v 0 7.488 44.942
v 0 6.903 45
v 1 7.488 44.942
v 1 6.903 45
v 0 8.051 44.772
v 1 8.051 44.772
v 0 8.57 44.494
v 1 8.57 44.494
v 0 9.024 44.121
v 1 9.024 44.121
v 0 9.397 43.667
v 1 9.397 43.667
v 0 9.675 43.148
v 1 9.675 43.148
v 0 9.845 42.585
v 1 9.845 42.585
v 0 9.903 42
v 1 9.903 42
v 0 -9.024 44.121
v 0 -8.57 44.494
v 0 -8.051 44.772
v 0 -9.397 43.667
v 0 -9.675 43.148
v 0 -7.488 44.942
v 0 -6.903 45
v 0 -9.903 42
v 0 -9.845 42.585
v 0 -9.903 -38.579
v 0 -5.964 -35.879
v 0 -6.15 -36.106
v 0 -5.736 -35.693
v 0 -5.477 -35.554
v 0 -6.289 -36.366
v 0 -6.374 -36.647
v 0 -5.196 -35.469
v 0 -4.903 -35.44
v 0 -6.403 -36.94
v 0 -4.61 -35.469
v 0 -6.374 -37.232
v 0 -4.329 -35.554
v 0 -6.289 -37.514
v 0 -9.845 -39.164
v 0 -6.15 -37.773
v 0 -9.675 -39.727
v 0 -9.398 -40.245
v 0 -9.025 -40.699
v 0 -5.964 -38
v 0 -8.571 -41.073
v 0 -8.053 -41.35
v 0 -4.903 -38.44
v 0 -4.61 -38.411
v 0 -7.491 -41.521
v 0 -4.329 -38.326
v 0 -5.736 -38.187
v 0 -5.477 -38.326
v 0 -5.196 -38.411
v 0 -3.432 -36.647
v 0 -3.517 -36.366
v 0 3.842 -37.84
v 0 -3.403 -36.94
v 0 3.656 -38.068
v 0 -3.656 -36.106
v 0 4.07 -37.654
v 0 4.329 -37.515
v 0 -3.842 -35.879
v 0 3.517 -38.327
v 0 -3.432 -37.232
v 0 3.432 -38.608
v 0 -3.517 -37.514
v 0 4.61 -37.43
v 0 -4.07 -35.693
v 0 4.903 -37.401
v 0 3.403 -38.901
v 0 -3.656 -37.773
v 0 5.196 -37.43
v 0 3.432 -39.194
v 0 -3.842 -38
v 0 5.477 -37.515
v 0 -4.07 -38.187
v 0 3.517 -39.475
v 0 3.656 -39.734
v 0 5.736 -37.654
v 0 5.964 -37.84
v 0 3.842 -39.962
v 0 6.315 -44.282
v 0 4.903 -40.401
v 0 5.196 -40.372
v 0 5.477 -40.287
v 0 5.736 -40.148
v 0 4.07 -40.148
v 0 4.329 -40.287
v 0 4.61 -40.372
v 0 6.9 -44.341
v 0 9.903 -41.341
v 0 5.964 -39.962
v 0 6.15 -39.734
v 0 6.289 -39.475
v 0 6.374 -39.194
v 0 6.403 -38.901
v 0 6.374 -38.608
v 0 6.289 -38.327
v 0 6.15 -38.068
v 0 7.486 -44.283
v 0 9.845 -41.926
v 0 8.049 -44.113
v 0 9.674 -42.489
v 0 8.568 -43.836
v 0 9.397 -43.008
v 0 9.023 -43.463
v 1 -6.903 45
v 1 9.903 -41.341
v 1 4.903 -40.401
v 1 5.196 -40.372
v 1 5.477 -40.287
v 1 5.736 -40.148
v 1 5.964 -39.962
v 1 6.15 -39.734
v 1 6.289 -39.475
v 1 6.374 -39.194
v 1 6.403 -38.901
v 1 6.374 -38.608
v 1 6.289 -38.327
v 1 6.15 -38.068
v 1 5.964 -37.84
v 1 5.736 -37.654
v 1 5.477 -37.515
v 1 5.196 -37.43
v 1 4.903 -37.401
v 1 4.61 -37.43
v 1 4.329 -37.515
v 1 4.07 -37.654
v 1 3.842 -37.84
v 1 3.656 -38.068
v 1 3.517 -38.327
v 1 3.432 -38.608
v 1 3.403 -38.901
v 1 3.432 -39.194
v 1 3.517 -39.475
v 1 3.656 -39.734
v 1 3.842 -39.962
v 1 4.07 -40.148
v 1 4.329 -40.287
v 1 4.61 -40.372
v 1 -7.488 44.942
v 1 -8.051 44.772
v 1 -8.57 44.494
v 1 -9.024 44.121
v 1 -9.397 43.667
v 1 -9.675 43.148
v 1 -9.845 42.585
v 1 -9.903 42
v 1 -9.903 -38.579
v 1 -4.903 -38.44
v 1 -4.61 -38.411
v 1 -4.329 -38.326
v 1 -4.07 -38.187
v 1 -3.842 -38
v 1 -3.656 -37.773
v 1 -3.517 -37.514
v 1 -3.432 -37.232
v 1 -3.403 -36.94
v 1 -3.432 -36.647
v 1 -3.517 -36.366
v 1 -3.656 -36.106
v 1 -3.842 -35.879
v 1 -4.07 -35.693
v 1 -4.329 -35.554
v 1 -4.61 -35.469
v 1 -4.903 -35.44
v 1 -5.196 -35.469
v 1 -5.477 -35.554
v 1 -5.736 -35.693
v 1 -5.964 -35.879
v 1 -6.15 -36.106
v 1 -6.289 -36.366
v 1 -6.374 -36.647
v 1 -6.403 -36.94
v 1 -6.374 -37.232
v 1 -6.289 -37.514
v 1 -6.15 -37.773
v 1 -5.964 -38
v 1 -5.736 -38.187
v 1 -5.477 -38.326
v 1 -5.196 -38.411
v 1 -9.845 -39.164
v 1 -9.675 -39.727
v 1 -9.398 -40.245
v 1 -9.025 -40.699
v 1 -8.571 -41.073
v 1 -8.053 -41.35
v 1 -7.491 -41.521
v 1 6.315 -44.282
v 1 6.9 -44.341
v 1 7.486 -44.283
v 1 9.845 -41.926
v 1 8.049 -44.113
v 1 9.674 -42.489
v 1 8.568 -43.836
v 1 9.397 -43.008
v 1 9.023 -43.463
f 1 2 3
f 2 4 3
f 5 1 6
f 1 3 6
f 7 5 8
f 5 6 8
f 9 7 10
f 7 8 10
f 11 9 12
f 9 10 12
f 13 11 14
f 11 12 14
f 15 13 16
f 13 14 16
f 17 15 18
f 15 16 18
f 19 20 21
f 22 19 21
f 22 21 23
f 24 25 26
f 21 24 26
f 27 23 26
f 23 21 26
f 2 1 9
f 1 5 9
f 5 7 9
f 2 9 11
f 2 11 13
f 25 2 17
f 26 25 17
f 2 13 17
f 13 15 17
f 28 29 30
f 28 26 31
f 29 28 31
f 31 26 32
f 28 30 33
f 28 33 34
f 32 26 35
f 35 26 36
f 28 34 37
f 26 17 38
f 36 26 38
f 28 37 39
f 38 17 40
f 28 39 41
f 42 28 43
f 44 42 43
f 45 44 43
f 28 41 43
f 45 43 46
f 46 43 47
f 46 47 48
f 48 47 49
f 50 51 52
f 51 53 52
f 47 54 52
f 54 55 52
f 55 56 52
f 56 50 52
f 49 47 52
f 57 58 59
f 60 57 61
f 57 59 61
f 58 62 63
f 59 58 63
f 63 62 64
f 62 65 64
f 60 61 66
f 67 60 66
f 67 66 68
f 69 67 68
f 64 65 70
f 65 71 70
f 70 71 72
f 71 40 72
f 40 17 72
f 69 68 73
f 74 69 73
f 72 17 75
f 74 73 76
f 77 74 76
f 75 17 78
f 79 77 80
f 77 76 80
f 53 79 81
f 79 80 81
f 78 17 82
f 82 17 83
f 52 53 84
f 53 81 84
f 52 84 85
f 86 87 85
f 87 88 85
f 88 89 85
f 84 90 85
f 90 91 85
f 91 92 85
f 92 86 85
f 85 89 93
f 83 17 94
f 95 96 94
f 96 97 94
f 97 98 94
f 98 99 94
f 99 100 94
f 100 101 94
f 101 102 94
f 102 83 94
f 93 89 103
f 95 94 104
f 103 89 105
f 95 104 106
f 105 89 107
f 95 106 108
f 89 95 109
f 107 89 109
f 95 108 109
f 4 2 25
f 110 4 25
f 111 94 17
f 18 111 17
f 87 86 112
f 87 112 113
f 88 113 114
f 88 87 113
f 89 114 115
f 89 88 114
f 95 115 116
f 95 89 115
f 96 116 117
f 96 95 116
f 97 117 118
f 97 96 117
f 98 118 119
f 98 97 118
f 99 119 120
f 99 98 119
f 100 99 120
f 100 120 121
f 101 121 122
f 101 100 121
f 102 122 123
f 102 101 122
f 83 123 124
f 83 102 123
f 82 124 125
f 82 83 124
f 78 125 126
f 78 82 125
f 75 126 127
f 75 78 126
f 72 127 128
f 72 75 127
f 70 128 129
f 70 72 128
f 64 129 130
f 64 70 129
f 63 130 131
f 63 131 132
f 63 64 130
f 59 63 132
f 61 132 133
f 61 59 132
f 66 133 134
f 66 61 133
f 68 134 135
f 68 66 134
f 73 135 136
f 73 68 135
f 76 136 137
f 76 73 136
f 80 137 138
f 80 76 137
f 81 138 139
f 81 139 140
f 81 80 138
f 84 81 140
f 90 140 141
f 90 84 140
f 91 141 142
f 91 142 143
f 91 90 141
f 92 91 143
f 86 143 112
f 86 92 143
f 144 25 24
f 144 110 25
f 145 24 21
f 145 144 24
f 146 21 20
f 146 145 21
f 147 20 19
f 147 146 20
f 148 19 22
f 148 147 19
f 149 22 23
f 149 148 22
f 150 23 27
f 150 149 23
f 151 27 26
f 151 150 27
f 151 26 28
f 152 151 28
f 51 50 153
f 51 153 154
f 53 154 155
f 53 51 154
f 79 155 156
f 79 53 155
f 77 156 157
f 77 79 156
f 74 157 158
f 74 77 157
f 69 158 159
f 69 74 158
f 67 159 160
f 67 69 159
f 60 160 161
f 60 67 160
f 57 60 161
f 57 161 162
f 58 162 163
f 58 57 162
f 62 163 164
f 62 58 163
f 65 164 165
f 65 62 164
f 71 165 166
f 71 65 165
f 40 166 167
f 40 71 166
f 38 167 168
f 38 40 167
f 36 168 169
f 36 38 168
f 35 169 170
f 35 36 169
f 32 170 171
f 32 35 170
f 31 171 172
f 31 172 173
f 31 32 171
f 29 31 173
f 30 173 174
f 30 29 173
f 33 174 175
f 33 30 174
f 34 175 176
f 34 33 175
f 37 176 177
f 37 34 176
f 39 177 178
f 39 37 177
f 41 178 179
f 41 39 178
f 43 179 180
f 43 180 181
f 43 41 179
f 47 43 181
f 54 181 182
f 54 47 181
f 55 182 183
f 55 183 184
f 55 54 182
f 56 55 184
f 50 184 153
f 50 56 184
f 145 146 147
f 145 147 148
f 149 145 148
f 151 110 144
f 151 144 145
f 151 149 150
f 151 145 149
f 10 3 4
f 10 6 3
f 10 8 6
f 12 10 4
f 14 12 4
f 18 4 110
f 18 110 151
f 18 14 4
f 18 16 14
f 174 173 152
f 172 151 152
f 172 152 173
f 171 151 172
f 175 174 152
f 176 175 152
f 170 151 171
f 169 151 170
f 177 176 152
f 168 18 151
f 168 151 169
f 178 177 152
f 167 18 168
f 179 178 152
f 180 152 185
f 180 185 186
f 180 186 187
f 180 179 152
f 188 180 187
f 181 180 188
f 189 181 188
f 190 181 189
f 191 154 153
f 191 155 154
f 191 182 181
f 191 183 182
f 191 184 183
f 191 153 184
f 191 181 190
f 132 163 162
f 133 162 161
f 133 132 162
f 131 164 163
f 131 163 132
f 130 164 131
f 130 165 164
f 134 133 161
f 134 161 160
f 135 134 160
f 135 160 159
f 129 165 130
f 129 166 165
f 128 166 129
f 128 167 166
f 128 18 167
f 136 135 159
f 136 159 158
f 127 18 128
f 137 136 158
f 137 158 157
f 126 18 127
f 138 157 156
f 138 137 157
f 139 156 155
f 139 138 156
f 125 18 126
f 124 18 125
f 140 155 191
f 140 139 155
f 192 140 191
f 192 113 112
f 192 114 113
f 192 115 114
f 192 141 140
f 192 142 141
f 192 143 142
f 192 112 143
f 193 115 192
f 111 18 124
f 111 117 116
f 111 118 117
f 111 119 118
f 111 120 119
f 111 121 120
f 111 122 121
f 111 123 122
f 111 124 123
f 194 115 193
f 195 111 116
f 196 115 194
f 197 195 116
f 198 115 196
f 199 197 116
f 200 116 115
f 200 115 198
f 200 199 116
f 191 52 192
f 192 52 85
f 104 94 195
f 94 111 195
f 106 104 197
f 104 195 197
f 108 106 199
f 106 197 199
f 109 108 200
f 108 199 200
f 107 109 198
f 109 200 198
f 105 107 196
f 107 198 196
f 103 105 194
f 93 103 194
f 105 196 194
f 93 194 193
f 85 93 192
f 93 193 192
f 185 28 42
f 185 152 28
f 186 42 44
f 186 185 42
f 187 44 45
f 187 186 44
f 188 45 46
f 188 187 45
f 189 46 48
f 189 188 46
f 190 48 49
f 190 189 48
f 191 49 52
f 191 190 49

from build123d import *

# Parameters (mm, degrees)
SKETCH_1_R      = 1.5
EXTRUDE_1_DEPTH = 1
FILLET_1_R      = 3


with BuildPart() as part:
    # ｽｹｯﾁ1 → ﾎﾞｽ - 押し出し1 (new body)
    with BuildSketch(Plane(origin=(0, 0, 0), x_dir=(0, 0, -1), z_dir=(1, 0, 0))):
        Polygon((-45, 9.902902223), (-45, -9.902902223), (41.038814835, -9.902902223), (45, 9.902902223), align=None)
        with Locations((36.939800248, -4.902902223)):
            Circle(SKETCH_1_R, mode=Mode.SUBTRACT)
        with Locations((38.900973156, 4.902902223)):
            Circle(SKETCH_1_R, mode=Mode.SUBTRACT)
    extrude(amount=EXTRUDE_1_DEPTH)

    # ﾌｨﾚｯﾄ1
    fillet_1_edges = [part.edges().sort_by_distance(p)[0] for p in [
        (0.5, -9.902902223, -41.038814835),
        (0.5, -9.902902223, 45),
        (0.5, 9.902902223, 45),
        (0.5, 9.902902223, -45),
    ]]
    fillet(fillet_1_edges, radius=FILLET_1_R)


solid = part.part
